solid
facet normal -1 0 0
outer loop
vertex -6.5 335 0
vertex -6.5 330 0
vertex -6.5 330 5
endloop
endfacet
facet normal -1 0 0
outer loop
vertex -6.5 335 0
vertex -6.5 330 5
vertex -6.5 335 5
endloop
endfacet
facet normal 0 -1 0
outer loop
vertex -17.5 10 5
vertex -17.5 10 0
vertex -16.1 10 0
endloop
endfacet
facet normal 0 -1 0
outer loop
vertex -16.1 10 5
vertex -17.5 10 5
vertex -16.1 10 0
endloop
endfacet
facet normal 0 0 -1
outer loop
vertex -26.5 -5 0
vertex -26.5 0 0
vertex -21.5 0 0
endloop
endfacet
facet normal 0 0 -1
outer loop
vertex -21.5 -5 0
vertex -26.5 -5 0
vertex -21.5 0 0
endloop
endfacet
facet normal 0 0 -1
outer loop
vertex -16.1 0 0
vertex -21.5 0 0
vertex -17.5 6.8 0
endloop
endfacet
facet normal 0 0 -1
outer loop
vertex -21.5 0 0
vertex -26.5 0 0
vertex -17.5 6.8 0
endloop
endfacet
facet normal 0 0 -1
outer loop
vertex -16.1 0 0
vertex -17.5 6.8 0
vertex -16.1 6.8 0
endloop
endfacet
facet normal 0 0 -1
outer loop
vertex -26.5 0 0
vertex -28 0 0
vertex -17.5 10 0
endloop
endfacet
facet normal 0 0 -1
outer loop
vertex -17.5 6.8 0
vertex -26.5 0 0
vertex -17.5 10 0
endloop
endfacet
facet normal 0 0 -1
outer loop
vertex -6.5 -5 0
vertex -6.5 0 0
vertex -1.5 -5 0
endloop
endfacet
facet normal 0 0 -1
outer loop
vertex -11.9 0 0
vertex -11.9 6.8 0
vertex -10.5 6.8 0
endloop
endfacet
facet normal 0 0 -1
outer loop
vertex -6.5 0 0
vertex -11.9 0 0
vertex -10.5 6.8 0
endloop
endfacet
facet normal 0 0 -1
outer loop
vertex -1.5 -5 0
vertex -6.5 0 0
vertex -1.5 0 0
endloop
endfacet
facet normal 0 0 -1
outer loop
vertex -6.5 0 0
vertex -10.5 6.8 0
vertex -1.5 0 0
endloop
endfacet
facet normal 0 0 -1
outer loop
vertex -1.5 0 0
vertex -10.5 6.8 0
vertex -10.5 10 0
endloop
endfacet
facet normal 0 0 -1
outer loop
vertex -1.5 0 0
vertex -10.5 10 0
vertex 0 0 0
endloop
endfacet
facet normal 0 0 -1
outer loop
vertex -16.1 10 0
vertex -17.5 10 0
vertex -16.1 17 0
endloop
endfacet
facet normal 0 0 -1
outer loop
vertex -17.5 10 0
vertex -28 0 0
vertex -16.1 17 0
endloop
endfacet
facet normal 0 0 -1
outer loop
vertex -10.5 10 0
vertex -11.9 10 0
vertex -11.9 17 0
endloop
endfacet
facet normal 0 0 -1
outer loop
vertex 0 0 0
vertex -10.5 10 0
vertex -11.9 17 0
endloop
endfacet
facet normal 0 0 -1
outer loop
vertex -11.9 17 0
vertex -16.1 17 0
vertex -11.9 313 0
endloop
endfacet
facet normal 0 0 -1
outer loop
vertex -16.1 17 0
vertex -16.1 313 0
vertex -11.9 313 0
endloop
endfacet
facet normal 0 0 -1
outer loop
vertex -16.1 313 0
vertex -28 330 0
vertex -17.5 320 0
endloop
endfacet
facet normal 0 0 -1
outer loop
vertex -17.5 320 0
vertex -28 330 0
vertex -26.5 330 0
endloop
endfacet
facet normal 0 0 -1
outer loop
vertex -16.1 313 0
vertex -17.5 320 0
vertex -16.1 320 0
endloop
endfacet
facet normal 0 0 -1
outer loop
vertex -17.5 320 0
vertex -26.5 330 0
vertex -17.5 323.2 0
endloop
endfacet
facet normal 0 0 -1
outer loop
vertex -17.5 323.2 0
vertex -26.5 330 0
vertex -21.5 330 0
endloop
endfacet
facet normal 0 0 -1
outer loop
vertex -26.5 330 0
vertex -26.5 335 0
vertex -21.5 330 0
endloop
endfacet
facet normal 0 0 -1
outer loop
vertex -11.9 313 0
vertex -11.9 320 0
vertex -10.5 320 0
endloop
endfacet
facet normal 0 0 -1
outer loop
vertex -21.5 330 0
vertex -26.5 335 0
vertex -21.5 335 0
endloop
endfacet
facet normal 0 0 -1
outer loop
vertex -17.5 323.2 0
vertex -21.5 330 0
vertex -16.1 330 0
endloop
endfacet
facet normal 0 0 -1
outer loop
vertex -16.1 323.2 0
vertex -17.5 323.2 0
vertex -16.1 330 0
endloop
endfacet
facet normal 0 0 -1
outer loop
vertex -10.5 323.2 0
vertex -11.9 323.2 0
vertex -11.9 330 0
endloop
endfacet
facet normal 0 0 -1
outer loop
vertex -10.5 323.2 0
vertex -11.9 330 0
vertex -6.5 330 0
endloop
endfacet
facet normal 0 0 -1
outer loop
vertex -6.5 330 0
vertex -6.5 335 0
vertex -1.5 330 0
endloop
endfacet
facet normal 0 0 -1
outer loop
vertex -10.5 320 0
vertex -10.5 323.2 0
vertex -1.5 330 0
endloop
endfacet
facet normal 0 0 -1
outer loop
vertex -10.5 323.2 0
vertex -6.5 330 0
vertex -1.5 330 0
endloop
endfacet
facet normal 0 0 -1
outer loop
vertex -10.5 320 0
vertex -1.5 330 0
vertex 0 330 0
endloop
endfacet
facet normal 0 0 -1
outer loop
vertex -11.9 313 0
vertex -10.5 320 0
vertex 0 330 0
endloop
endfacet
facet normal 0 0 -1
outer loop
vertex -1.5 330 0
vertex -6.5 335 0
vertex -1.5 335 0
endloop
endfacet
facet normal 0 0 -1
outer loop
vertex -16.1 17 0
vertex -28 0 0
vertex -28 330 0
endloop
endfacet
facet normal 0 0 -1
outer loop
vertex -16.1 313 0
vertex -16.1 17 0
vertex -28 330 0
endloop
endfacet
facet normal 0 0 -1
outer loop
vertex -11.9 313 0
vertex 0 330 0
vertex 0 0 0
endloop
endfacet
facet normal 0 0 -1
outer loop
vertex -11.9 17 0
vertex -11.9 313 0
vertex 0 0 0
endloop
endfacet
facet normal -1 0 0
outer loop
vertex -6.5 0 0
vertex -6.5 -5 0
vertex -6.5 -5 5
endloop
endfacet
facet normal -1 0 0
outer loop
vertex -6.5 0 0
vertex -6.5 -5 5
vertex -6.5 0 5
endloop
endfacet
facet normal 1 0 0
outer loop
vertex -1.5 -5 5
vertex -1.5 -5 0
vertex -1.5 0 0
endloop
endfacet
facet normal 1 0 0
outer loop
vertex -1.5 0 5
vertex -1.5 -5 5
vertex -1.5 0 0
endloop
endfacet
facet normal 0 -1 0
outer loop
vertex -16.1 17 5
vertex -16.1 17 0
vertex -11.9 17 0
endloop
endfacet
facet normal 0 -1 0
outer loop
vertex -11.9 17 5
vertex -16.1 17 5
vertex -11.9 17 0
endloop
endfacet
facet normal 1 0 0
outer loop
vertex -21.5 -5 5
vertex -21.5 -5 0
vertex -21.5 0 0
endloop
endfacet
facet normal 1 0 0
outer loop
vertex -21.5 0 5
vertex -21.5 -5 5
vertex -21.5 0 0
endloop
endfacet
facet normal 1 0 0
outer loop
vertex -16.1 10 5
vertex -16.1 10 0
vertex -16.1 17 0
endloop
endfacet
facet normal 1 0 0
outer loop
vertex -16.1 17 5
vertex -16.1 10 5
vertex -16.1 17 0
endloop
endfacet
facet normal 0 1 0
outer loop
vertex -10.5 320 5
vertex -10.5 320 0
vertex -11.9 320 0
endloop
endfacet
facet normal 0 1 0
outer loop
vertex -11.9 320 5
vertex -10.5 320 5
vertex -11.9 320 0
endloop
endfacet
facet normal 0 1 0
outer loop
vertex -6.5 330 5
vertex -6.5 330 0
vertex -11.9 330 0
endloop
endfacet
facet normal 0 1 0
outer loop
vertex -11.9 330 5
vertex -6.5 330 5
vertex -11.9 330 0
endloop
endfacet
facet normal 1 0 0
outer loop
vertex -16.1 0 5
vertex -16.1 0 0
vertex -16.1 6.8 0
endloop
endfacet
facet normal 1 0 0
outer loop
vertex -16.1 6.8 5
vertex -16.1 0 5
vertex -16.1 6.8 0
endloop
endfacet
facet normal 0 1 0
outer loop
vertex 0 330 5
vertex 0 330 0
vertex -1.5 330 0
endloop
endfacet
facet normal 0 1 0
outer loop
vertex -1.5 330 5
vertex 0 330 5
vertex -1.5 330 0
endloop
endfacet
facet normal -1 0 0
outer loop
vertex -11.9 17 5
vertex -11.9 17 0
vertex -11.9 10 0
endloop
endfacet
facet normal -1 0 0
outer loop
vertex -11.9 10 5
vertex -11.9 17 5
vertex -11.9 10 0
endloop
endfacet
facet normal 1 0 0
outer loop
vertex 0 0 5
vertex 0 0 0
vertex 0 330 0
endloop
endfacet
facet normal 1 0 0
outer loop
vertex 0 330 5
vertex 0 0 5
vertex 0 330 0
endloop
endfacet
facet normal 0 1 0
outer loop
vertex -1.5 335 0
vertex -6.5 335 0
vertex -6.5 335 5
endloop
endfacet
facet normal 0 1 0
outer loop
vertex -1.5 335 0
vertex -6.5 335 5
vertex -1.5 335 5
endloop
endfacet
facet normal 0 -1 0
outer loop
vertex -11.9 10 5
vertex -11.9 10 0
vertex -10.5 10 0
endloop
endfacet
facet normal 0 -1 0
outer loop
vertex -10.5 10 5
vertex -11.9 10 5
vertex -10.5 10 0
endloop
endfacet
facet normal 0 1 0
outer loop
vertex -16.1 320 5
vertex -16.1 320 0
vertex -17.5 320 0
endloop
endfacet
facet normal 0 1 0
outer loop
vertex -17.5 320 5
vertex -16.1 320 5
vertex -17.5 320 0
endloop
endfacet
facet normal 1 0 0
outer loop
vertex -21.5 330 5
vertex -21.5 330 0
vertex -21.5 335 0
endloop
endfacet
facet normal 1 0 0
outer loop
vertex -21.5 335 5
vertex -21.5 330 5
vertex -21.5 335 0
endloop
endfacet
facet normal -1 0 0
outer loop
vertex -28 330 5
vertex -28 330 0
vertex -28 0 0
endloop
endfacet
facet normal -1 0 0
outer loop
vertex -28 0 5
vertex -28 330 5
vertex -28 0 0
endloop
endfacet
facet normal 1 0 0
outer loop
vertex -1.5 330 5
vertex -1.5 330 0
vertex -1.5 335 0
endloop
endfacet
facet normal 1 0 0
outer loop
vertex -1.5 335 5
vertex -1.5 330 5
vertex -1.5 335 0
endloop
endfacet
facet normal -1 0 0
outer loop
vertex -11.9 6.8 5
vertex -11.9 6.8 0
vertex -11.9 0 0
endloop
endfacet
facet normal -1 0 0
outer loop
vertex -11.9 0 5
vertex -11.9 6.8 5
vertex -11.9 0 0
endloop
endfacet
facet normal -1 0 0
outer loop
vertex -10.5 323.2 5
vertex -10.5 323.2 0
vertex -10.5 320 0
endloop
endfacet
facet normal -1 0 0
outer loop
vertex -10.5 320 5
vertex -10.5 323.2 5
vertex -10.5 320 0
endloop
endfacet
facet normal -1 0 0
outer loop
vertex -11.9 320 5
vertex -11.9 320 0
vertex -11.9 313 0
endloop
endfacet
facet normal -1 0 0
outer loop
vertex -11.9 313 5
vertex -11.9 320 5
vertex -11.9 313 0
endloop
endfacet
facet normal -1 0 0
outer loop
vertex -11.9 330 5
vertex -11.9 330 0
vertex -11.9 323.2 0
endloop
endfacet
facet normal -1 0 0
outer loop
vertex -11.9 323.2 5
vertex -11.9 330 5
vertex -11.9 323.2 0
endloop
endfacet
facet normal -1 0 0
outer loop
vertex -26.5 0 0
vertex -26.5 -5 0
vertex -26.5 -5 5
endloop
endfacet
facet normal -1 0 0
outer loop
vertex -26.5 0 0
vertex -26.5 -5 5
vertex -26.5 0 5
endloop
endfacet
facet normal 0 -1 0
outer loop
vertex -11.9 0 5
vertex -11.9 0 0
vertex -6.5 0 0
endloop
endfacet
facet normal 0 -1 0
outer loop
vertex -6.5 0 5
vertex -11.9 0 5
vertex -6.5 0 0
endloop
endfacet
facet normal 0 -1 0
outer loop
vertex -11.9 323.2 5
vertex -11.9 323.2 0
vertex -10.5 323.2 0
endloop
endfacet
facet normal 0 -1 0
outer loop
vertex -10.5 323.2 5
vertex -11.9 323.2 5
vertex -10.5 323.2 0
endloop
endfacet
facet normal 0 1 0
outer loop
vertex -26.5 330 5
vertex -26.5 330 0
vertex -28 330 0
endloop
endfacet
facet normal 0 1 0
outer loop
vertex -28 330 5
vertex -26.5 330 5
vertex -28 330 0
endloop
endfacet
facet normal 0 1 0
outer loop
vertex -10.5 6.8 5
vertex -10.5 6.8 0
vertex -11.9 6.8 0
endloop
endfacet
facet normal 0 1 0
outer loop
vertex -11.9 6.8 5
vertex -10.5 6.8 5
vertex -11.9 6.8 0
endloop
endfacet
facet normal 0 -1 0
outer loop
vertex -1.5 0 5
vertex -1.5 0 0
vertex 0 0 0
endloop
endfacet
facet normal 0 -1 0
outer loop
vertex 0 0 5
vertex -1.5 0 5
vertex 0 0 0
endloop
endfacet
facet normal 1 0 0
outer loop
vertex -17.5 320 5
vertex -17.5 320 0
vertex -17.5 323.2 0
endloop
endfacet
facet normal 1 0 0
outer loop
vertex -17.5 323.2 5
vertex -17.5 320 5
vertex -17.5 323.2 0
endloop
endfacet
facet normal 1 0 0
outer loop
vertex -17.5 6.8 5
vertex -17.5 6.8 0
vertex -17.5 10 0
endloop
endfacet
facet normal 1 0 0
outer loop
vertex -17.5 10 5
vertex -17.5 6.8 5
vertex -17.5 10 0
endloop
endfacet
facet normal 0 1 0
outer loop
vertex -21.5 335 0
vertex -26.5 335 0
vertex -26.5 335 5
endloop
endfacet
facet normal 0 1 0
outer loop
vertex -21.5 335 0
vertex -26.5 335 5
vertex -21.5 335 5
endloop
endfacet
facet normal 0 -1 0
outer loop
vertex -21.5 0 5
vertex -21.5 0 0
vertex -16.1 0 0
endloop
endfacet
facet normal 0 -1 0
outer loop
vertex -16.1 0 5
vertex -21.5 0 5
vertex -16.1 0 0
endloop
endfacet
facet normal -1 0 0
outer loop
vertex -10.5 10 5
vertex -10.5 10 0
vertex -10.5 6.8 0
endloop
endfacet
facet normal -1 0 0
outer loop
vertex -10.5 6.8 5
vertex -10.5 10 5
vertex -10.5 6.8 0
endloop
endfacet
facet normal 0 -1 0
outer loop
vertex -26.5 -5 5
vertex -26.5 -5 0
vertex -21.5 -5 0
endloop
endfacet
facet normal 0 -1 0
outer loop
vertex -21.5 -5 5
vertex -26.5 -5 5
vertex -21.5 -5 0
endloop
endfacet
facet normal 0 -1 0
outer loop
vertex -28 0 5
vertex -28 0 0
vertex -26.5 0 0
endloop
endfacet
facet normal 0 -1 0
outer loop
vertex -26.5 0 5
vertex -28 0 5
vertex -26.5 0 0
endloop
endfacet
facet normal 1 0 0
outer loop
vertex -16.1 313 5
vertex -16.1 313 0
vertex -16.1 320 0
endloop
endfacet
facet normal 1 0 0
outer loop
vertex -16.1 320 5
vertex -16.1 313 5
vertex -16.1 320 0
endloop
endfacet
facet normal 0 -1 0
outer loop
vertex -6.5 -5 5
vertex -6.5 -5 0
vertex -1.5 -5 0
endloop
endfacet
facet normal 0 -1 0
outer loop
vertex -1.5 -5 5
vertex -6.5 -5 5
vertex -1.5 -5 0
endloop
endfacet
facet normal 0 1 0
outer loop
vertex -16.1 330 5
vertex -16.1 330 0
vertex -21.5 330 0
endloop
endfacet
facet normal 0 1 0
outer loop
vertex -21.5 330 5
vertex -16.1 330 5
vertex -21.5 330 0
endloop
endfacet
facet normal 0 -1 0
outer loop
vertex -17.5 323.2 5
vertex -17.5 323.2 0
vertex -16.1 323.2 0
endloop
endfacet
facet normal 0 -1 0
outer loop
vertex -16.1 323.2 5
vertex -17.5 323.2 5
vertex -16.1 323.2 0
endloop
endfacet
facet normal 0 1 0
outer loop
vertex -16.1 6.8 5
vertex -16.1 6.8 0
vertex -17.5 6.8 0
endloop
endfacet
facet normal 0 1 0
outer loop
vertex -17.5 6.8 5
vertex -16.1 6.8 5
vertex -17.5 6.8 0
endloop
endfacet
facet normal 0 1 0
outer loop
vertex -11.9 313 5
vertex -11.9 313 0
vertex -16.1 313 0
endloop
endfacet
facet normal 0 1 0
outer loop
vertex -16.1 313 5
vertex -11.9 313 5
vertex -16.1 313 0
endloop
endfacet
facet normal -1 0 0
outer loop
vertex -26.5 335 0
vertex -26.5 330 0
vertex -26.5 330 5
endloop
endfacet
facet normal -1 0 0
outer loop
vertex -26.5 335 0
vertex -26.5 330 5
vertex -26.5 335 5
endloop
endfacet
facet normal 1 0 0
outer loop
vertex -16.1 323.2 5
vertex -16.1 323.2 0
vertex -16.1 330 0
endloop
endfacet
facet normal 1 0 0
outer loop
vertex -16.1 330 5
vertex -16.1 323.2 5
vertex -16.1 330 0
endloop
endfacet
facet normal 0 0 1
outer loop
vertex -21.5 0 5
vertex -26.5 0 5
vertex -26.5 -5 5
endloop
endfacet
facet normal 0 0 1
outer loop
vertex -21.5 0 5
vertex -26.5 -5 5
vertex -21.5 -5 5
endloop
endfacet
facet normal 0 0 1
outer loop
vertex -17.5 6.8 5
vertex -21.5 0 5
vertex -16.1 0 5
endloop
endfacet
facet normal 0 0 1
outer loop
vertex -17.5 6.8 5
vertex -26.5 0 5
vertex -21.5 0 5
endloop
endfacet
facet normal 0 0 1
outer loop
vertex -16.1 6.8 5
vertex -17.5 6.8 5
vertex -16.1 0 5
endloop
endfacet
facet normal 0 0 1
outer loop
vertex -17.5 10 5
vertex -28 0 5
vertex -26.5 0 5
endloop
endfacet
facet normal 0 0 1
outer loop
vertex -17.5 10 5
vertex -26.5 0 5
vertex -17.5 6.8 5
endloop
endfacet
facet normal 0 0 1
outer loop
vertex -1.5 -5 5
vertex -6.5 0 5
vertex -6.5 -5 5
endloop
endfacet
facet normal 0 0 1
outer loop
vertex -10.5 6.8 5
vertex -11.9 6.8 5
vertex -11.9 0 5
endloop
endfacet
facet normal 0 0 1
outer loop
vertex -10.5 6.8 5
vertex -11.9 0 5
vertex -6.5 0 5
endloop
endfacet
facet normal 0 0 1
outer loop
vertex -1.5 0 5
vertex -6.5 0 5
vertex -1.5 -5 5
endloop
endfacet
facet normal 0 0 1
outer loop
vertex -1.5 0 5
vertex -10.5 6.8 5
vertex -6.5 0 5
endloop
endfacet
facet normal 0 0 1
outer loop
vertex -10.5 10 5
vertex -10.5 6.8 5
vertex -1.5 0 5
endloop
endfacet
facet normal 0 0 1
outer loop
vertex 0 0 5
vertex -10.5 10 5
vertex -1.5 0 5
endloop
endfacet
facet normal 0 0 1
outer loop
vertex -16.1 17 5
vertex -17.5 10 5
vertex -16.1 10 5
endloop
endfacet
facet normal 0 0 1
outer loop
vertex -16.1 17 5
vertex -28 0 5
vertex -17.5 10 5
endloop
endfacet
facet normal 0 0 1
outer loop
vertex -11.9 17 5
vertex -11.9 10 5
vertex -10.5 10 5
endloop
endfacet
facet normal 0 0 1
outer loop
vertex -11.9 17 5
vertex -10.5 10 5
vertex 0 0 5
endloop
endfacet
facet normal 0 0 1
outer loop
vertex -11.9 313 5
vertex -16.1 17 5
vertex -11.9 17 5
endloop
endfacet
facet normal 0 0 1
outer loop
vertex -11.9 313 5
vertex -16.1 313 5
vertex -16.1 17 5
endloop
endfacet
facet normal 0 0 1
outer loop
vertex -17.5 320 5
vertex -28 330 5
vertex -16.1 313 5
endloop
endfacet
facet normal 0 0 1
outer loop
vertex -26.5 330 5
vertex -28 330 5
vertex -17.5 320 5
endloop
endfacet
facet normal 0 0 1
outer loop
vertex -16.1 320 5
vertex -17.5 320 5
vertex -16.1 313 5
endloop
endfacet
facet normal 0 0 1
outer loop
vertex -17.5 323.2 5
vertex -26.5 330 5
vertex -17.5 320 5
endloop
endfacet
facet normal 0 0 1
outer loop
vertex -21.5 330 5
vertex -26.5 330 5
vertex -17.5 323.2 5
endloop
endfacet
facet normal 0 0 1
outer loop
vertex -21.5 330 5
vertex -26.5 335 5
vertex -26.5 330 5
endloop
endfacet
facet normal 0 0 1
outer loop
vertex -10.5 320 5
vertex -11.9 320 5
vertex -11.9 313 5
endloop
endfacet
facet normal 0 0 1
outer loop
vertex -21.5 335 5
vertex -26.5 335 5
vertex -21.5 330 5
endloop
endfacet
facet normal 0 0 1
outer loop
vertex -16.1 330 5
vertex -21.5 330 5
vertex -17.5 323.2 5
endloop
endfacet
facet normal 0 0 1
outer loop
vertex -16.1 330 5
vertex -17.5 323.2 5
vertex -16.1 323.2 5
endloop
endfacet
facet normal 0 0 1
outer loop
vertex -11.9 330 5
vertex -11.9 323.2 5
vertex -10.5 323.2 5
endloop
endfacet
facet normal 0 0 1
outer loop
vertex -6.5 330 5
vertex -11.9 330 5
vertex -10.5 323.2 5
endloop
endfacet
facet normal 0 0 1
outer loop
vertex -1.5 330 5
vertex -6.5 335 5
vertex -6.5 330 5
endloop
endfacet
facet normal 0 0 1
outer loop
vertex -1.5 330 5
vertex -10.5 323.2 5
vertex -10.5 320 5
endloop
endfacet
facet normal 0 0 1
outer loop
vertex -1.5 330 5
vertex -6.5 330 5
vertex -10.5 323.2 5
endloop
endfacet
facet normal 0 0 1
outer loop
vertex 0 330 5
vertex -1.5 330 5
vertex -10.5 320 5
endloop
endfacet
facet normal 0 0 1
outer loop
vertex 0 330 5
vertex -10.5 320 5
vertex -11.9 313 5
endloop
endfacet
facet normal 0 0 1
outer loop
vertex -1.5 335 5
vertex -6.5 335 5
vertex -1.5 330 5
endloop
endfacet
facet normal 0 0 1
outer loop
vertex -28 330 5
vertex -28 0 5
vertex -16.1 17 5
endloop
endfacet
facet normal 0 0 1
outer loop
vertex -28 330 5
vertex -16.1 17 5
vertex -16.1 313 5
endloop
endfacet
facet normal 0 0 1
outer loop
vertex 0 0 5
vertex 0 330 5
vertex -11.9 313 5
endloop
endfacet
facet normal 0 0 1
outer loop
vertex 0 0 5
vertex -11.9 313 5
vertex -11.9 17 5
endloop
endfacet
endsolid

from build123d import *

# Parameters (mm, degrees)
SKETCH1_W           = 5
SKETCH1_H           = 5
BOSS_EXTRUDE1_DEPTH = 5


with BuildPart() as part:
    # Sketch1 → Boss-Extrude1 (new body)
    with BuildSketch(Plane.XY):
        with Locations((-4, 332.5)):
            Rectangle(SKETCH1_W, SKETCH1_H)
        with Locations((-24, 332.5)):
            Rectangle(SKETCH1_W, SKETCH1_H)
        Polygon((-26.5, 330), (-28, 330), (-28, 0), (-26.5, 0), (-21.5, 0), (-16.1, 0), (-16.1, 6.8), (-17.5, 6.8), (-17.5, 10), (-16.1, 10), (-16.1, 17), (-11.9, 17), (-11.9, 10), (-10.5, 10), (-10.5, 6.8), (-11.9, 6.8), (-11.9, 0), (-6.5, 0), (-1.5, 0), (0, 0), (0, 330), (-1.5, 330), (-6.5, 330), (-11.9, 330), (-11.9, 323.2), (-10.5, 323.2), (-10.5, 320), (-11.9, 320), (-11.9, 313), (-16.1, 313), (-16.1, 320), (-17.5, 320), (-17.5, 323.2), (-16.1, 323.2), (-16.1, 330), (-21.5, 330), align=None)
        with Locations((-4, -2.5)):
            Rectangle(SKETCH1_W, SKETCH1_H)
        with Locations((-24, -2.5)):
            Rectangle(SKETCH1_W, SKETCH1_H)
    extrude(amount=BOSS_EXTRUDE1_DEPTH)


solid = part.part
